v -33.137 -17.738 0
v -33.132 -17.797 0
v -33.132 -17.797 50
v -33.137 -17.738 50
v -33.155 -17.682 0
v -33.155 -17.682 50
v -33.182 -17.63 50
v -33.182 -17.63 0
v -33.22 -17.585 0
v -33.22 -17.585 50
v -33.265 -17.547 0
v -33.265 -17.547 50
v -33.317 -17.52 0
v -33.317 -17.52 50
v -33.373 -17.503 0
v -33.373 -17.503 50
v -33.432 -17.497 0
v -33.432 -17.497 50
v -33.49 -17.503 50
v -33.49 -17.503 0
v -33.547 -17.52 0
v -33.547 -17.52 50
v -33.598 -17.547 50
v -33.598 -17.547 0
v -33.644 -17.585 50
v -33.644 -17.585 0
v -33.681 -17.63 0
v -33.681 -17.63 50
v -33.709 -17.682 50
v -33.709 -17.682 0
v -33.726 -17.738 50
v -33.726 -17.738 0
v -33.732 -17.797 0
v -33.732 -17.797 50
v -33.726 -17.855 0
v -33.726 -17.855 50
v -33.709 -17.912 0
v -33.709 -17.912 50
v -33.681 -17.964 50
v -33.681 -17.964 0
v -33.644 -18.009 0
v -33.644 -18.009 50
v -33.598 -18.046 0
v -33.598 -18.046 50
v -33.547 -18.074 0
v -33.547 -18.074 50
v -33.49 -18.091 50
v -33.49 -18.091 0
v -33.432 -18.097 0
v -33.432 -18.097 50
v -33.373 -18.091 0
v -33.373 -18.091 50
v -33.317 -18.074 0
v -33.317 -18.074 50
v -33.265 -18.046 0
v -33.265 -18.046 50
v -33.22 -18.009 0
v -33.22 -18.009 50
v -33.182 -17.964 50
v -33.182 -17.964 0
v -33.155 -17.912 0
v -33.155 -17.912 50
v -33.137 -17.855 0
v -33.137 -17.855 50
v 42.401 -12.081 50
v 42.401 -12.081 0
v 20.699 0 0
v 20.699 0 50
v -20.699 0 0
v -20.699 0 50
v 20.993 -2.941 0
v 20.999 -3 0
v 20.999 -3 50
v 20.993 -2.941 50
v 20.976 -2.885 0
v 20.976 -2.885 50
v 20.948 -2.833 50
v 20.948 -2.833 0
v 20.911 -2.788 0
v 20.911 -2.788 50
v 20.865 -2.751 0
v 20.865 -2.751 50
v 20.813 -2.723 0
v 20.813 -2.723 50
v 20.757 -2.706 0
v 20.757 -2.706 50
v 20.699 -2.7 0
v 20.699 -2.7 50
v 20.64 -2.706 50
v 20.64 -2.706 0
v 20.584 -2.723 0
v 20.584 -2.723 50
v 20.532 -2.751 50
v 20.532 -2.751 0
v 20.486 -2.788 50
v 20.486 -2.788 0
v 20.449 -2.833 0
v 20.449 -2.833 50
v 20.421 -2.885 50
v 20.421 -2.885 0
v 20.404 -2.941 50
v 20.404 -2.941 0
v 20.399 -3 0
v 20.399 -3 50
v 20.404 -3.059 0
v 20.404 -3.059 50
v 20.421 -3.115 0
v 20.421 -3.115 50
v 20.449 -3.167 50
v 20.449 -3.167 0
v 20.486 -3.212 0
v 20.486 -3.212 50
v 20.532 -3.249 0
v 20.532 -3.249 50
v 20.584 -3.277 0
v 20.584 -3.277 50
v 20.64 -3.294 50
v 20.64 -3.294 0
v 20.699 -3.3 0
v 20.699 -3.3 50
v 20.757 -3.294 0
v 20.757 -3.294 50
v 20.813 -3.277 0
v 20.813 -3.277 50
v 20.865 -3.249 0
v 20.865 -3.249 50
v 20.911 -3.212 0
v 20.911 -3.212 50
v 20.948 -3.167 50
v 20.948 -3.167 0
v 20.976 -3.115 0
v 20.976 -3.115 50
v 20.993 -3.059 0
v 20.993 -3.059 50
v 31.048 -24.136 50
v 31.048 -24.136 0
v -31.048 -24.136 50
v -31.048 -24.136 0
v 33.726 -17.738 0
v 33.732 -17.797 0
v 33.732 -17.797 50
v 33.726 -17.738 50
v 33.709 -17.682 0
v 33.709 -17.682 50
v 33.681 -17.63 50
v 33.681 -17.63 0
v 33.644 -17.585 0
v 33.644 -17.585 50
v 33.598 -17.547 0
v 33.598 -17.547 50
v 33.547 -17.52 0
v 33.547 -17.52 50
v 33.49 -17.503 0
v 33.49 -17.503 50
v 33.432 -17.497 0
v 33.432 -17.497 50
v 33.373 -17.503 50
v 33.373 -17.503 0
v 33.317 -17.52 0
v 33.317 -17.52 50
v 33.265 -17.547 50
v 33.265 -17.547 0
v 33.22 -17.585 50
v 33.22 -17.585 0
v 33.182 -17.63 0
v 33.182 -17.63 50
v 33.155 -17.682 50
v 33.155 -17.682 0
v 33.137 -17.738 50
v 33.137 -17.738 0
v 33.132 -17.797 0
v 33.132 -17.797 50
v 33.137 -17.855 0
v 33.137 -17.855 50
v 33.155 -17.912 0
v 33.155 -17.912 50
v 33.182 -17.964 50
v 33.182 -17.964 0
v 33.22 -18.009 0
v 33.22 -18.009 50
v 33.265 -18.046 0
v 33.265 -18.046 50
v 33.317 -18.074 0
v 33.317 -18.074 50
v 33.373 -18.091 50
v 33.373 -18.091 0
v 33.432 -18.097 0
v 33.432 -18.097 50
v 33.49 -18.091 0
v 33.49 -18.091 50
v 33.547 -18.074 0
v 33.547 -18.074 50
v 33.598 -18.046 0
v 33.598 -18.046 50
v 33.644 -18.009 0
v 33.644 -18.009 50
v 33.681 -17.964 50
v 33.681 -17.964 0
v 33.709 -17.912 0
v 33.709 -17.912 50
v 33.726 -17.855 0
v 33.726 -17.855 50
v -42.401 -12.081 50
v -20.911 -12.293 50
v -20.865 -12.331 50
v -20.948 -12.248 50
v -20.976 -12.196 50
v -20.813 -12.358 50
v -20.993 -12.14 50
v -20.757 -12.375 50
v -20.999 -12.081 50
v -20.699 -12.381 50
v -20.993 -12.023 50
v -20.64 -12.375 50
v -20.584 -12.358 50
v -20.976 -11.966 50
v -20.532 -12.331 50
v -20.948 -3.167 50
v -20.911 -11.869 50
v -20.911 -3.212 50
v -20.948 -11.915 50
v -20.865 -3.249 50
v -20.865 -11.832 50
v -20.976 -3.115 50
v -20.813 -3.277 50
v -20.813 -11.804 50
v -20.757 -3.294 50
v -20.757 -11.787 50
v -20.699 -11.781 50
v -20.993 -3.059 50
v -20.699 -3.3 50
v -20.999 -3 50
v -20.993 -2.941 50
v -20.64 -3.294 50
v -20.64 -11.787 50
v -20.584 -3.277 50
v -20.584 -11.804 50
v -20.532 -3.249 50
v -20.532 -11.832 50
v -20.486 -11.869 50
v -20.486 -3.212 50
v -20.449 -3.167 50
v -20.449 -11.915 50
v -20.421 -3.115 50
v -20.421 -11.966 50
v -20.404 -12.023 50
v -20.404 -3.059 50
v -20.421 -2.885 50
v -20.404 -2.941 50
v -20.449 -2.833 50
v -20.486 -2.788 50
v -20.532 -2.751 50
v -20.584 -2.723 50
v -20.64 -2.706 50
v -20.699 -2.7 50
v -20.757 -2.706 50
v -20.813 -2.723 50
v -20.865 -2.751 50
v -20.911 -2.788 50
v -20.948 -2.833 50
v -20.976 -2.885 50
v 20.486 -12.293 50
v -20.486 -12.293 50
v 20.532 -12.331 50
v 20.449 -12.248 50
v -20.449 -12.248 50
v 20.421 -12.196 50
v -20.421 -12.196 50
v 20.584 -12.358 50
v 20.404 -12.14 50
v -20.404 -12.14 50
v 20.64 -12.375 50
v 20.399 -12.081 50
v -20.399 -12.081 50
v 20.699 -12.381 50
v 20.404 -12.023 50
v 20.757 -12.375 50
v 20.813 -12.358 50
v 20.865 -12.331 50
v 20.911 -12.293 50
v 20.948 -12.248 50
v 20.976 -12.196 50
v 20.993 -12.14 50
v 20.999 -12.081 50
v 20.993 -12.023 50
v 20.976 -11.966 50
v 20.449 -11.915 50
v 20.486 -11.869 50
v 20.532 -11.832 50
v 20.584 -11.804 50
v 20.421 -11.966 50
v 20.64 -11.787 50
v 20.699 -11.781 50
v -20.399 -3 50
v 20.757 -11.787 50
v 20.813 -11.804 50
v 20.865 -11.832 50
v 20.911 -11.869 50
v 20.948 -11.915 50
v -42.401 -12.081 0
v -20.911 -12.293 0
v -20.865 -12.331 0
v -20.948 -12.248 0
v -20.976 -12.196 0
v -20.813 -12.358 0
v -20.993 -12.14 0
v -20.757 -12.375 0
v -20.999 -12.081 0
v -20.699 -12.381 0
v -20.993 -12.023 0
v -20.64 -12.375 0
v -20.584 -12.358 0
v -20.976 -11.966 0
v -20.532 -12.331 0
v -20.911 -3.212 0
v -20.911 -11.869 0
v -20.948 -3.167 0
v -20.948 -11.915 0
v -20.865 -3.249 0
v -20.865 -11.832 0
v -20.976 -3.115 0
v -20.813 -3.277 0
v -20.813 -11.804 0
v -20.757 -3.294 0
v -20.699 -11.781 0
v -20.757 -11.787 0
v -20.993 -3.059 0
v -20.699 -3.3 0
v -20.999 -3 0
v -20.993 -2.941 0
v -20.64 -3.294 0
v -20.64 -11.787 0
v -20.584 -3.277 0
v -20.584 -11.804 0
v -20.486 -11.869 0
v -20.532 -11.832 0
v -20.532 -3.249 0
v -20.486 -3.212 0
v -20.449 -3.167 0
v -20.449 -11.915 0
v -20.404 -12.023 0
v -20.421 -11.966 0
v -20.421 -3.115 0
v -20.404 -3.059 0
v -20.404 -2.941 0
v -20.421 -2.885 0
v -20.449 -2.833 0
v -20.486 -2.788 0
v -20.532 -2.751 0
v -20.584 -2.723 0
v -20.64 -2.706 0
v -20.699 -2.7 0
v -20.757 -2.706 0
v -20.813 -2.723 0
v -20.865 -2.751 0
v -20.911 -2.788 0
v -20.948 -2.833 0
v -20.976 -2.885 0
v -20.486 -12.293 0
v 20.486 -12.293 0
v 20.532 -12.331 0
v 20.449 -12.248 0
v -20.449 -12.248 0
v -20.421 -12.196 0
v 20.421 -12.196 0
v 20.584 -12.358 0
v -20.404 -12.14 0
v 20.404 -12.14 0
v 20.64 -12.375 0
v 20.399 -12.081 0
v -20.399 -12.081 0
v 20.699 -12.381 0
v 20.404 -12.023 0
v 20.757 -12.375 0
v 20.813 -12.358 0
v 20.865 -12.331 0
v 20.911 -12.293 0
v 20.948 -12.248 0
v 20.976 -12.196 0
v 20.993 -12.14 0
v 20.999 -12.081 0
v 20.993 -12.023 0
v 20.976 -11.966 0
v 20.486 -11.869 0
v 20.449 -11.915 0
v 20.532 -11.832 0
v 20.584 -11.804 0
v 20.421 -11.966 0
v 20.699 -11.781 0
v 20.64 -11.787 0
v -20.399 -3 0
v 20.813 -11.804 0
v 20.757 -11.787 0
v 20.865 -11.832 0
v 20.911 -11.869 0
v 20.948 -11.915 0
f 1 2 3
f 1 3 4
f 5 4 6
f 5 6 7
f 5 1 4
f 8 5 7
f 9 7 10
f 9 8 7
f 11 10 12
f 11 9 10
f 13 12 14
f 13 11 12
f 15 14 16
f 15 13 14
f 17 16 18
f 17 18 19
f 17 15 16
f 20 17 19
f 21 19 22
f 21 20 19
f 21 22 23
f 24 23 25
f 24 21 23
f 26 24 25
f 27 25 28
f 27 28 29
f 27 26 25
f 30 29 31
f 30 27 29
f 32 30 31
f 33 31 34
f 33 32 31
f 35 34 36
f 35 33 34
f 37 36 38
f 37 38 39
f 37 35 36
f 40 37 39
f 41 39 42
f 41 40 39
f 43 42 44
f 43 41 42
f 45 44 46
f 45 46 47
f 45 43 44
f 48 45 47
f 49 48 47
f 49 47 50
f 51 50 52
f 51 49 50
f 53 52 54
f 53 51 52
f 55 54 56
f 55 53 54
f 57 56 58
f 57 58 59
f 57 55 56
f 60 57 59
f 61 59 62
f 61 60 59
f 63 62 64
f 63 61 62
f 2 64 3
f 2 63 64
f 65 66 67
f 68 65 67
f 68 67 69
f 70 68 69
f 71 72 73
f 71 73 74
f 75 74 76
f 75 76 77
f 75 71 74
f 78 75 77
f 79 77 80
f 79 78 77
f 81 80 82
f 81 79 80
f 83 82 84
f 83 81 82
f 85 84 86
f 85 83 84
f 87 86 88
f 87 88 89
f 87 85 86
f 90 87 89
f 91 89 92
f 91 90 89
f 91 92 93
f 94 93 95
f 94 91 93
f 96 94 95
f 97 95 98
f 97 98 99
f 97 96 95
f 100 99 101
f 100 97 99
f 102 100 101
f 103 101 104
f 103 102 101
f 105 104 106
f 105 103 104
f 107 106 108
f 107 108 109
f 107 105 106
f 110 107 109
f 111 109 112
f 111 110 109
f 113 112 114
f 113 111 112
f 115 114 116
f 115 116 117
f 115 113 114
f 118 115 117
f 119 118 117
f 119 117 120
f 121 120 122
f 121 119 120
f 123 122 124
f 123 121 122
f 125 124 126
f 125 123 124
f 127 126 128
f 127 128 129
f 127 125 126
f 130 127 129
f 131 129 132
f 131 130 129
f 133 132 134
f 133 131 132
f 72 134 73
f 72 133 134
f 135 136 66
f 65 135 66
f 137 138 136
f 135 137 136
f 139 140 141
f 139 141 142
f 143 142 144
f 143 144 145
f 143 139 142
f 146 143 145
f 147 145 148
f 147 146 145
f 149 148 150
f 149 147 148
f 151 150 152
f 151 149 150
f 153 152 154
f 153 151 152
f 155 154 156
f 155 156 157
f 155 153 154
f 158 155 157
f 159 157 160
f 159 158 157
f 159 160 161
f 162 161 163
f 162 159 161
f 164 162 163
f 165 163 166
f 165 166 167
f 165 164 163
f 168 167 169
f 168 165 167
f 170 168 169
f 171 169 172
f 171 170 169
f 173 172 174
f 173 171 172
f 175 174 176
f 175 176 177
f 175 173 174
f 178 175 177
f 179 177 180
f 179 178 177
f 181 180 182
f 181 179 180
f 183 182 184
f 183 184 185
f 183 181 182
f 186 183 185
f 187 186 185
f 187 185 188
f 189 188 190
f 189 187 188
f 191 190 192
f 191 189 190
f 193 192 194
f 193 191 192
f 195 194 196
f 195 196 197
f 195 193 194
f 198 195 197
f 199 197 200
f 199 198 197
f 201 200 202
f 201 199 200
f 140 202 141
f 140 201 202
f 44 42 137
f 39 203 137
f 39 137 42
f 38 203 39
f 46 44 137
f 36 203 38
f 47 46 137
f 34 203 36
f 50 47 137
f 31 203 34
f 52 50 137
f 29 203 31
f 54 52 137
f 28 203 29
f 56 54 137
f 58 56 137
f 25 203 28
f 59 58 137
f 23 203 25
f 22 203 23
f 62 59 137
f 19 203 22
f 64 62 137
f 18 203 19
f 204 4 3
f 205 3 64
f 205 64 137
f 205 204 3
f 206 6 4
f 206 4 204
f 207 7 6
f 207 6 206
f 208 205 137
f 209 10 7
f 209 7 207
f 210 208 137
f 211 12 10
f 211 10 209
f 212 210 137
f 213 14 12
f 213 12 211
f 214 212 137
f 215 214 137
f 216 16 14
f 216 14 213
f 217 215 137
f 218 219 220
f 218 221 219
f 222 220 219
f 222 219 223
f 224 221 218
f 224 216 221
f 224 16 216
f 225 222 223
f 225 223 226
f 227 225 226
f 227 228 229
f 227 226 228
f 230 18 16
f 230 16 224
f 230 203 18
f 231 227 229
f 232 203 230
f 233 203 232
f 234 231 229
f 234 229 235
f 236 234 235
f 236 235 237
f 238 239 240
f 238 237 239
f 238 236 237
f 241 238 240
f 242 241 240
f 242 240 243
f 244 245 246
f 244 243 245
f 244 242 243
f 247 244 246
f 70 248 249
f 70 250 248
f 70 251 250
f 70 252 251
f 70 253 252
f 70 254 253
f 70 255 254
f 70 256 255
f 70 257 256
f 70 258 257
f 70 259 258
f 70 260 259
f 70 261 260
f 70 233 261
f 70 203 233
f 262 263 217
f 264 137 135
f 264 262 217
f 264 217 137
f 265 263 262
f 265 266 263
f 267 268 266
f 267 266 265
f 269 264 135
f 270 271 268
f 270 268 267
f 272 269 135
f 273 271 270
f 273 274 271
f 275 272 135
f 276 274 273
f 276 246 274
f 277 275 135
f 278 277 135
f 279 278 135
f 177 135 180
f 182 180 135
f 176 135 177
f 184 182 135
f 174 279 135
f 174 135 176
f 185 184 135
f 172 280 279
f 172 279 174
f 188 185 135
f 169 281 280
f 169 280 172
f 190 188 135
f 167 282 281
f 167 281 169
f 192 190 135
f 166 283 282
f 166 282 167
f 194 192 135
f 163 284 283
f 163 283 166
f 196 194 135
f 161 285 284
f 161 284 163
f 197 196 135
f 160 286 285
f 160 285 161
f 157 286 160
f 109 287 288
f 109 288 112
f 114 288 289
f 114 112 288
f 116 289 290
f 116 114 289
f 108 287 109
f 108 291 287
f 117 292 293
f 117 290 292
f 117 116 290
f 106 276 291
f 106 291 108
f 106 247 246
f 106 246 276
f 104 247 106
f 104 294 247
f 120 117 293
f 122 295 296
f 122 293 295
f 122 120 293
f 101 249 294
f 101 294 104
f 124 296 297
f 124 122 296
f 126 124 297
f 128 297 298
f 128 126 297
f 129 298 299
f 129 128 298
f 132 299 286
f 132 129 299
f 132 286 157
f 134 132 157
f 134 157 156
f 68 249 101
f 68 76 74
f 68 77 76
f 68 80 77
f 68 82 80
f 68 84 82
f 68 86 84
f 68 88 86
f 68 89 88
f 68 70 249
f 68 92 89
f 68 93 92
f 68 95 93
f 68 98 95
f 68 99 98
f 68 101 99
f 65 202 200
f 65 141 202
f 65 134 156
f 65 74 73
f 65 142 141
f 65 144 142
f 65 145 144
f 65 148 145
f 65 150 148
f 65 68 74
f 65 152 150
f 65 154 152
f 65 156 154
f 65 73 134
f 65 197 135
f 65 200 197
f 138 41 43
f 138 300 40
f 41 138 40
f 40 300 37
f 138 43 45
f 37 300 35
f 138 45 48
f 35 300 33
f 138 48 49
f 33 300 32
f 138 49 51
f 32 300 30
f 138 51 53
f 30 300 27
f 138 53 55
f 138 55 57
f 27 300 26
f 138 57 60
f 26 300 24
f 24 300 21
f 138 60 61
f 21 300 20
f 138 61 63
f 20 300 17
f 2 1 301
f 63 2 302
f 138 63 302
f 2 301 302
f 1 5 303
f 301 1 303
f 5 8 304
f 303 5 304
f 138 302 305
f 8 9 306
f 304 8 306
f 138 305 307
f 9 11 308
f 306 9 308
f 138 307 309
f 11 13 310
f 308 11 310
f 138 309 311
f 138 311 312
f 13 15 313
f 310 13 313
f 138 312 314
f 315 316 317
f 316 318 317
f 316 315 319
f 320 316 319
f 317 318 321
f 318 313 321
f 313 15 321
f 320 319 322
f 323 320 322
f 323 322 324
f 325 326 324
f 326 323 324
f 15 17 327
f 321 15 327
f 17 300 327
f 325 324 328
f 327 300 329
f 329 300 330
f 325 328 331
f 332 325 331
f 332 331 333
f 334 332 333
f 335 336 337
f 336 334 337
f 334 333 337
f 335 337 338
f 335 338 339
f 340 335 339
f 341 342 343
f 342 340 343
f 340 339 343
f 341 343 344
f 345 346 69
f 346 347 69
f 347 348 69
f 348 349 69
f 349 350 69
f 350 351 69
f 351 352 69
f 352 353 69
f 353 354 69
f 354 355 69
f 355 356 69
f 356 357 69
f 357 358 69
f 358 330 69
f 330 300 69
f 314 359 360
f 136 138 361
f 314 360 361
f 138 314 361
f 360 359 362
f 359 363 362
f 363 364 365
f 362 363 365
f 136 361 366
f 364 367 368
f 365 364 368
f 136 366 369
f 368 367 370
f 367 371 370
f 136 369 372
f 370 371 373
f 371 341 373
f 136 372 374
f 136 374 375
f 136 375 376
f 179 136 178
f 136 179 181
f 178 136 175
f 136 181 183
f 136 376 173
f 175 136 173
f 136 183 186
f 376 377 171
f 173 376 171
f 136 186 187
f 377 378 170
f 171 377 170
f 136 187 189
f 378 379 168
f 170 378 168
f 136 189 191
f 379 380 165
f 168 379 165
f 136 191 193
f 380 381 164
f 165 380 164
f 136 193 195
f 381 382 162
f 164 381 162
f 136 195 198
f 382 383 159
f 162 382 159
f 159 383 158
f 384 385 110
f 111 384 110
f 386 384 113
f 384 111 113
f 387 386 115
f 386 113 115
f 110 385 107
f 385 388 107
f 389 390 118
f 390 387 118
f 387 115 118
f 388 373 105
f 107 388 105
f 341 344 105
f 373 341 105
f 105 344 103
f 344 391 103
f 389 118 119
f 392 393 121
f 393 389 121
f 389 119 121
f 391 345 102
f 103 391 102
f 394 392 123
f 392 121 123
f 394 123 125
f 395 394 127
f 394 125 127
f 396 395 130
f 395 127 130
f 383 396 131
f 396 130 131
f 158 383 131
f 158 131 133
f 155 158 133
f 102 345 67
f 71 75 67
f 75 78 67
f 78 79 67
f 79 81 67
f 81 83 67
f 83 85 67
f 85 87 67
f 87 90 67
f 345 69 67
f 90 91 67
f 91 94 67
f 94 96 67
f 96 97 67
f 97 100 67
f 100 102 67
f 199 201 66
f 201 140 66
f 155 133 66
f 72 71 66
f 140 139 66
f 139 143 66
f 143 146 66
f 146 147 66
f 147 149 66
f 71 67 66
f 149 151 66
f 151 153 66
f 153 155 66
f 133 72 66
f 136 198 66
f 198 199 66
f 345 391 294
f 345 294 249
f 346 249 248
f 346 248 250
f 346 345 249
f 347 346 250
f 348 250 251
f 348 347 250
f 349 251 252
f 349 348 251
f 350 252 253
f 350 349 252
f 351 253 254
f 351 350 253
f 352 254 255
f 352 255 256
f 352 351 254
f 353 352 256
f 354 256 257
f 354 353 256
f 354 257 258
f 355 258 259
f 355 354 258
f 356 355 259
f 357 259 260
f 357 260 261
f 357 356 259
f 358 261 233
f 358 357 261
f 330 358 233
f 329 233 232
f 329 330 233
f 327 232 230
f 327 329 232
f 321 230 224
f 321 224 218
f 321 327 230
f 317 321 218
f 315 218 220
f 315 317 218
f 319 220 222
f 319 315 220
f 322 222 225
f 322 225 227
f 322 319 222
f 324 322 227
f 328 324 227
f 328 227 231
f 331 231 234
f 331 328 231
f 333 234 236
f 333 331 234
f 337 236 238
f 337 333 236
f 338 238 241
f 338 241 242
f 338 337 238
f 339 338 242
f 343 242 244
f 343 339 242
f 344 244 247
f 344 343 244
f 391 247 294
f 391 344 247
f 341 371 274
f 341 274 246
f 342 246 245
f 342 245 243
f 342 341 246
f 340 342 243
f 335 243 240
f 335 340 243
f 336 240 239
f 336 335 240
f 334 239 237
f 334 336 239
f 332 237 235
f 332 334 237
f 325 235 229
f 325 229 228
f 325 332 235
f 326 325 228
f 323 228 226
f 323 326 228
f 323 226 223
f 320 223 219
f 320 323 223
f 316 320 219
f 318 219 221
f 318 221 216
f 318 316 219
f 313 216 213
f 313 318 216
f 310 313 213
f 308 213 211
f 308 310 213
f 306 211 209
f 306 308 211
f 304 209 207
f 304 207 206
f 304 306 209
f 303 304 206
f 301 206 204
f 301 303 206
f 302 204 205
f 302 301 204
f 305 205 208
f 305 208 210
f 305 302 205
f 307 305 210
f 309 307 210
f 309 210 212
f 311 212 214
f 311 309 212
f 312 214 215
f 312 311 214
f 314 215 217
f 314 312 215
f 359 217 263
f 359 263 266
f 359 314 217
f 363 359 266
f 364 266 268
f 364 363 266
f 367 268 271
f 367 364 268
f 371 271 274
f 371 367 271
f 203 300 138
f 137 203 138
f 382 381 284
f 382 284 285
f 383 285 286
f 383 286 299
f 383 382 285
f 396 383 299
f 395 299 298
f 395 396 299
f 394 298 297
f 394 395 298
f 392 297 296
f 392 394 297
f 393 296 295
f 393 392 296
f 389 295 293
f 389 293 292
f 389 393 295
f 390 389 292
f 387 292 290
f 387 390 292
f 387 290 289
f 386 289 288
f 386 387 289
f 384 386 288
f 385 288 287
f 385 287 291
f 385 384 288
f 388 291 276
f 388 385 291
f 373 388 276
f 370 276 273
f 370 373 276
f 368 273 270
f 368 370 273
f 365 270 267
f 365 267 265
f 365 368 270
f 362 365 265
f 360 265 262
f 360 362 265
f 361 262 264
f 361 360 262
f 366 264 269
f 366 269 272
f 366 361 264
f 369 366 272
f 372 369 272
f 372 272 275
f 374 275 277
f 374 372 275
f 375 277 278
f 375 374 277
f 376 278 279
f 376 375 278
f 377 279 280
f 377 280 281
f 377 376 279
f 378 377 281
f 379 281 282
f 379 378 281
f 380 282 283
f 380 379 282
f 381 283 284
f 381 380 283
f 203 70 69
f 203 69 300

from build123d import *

# Parameters (mm, degrees)
SKETCH_1_R      = 0.82794133
SKETCH_1_R_2    = 1
SKETCH_1_R_3    = 0.3
EXTRUDE_3_DEPTH = 50


with BuildPart() as part:
    # 草图1 → 凸台-拉伸3 (new body)
    with BuildSketch(Plane.XY):
        Polygon((20.69853326, 0), (0, 0), (0, -24.135547841), (31.04779989, -24.135547841), (42.400668091, -12.081204645), align=None)
        with Locations((20.69853326, -12.081204645)):
            Circle(SKETCH_1_R, mode=Mode.SUBTRACT)
        with Locations((33.43169801, -17.796901608)):
            Circle(SKETCH_1_R_2, mode=Mode.SUBTRACT)
        with Locations((20.69853326, -3)):
            Circle(SKETCH_1_R, mode=Mode.SUBTRACT)
        with Locations((33.43169801, -17.796901608)):
            Circle(SKETCH_1_R_2)
        with Locations((33.43169801, -17.796901608)):
            Circle(SKETCH_1_R_3, mode=Mode.SUBTRACT)
        with Locations((20.69853326, -12.081204645)):
            Circle(SKETCH_1_R)
        with Locations((20.69853326, -12.081204645)):
            Circle(SKETCH_1_R_3, mode=Mode.SUBTRACT)
        with Locations((20.69853326, -3)):
            Circle(SKETCH_1_R)
        with Locations((20.69853326, -3)):
            Circle(SKETCH_1_R_3, mode=Mode.SUBTRACT)
        Polygon((0, 0), (-20.69853326, 0), (-42.400668091, -12.081204645), (-31.04779989, -24.135547841), (0, -24.135547841), align=None)
        with Locations((-33.43169801, -17.796901608)):
            Circle(SKETCH_1_R_2, mode=Mode.SUBTRACT)
        with Locations((-20.69853326, -12.081204645)):
            Circle(SKETCH_1_R, mode=Mode.SUBTRACT)
        with Locations((-20.69853326, -3)):
            Circle(SKETCH_1_R, mode=Mode.SUBTRACT)
        with Locations((-33.43169801, -17.796901608)):
            Circle(SKETCH_1_R_2)
        with Locations((-33.43169801, -17.796901608)):
            Circle(SKETCH_1_R_3, mode=Mode.SUBTRACT)
        with Locations((-20.69853326, -12.081204645)):
            Circle(SKETCH_1_R)
        with Locations((-20.69853326, -12.081204645)):
            Circle(SKETCH_1_R_3, mode=Mode.SUBTRACT)
        with Locations((-20.69853326, -3)):
            Circle(SKETCH_1_R)
        with Locations((-20.69853326, -3)):
            Circle(SKETCH_1_R_3, mode=Mode.SUBTRACT)
    extrude(amount=EXTRUDE_3_DEPTH)


solid = part.part
